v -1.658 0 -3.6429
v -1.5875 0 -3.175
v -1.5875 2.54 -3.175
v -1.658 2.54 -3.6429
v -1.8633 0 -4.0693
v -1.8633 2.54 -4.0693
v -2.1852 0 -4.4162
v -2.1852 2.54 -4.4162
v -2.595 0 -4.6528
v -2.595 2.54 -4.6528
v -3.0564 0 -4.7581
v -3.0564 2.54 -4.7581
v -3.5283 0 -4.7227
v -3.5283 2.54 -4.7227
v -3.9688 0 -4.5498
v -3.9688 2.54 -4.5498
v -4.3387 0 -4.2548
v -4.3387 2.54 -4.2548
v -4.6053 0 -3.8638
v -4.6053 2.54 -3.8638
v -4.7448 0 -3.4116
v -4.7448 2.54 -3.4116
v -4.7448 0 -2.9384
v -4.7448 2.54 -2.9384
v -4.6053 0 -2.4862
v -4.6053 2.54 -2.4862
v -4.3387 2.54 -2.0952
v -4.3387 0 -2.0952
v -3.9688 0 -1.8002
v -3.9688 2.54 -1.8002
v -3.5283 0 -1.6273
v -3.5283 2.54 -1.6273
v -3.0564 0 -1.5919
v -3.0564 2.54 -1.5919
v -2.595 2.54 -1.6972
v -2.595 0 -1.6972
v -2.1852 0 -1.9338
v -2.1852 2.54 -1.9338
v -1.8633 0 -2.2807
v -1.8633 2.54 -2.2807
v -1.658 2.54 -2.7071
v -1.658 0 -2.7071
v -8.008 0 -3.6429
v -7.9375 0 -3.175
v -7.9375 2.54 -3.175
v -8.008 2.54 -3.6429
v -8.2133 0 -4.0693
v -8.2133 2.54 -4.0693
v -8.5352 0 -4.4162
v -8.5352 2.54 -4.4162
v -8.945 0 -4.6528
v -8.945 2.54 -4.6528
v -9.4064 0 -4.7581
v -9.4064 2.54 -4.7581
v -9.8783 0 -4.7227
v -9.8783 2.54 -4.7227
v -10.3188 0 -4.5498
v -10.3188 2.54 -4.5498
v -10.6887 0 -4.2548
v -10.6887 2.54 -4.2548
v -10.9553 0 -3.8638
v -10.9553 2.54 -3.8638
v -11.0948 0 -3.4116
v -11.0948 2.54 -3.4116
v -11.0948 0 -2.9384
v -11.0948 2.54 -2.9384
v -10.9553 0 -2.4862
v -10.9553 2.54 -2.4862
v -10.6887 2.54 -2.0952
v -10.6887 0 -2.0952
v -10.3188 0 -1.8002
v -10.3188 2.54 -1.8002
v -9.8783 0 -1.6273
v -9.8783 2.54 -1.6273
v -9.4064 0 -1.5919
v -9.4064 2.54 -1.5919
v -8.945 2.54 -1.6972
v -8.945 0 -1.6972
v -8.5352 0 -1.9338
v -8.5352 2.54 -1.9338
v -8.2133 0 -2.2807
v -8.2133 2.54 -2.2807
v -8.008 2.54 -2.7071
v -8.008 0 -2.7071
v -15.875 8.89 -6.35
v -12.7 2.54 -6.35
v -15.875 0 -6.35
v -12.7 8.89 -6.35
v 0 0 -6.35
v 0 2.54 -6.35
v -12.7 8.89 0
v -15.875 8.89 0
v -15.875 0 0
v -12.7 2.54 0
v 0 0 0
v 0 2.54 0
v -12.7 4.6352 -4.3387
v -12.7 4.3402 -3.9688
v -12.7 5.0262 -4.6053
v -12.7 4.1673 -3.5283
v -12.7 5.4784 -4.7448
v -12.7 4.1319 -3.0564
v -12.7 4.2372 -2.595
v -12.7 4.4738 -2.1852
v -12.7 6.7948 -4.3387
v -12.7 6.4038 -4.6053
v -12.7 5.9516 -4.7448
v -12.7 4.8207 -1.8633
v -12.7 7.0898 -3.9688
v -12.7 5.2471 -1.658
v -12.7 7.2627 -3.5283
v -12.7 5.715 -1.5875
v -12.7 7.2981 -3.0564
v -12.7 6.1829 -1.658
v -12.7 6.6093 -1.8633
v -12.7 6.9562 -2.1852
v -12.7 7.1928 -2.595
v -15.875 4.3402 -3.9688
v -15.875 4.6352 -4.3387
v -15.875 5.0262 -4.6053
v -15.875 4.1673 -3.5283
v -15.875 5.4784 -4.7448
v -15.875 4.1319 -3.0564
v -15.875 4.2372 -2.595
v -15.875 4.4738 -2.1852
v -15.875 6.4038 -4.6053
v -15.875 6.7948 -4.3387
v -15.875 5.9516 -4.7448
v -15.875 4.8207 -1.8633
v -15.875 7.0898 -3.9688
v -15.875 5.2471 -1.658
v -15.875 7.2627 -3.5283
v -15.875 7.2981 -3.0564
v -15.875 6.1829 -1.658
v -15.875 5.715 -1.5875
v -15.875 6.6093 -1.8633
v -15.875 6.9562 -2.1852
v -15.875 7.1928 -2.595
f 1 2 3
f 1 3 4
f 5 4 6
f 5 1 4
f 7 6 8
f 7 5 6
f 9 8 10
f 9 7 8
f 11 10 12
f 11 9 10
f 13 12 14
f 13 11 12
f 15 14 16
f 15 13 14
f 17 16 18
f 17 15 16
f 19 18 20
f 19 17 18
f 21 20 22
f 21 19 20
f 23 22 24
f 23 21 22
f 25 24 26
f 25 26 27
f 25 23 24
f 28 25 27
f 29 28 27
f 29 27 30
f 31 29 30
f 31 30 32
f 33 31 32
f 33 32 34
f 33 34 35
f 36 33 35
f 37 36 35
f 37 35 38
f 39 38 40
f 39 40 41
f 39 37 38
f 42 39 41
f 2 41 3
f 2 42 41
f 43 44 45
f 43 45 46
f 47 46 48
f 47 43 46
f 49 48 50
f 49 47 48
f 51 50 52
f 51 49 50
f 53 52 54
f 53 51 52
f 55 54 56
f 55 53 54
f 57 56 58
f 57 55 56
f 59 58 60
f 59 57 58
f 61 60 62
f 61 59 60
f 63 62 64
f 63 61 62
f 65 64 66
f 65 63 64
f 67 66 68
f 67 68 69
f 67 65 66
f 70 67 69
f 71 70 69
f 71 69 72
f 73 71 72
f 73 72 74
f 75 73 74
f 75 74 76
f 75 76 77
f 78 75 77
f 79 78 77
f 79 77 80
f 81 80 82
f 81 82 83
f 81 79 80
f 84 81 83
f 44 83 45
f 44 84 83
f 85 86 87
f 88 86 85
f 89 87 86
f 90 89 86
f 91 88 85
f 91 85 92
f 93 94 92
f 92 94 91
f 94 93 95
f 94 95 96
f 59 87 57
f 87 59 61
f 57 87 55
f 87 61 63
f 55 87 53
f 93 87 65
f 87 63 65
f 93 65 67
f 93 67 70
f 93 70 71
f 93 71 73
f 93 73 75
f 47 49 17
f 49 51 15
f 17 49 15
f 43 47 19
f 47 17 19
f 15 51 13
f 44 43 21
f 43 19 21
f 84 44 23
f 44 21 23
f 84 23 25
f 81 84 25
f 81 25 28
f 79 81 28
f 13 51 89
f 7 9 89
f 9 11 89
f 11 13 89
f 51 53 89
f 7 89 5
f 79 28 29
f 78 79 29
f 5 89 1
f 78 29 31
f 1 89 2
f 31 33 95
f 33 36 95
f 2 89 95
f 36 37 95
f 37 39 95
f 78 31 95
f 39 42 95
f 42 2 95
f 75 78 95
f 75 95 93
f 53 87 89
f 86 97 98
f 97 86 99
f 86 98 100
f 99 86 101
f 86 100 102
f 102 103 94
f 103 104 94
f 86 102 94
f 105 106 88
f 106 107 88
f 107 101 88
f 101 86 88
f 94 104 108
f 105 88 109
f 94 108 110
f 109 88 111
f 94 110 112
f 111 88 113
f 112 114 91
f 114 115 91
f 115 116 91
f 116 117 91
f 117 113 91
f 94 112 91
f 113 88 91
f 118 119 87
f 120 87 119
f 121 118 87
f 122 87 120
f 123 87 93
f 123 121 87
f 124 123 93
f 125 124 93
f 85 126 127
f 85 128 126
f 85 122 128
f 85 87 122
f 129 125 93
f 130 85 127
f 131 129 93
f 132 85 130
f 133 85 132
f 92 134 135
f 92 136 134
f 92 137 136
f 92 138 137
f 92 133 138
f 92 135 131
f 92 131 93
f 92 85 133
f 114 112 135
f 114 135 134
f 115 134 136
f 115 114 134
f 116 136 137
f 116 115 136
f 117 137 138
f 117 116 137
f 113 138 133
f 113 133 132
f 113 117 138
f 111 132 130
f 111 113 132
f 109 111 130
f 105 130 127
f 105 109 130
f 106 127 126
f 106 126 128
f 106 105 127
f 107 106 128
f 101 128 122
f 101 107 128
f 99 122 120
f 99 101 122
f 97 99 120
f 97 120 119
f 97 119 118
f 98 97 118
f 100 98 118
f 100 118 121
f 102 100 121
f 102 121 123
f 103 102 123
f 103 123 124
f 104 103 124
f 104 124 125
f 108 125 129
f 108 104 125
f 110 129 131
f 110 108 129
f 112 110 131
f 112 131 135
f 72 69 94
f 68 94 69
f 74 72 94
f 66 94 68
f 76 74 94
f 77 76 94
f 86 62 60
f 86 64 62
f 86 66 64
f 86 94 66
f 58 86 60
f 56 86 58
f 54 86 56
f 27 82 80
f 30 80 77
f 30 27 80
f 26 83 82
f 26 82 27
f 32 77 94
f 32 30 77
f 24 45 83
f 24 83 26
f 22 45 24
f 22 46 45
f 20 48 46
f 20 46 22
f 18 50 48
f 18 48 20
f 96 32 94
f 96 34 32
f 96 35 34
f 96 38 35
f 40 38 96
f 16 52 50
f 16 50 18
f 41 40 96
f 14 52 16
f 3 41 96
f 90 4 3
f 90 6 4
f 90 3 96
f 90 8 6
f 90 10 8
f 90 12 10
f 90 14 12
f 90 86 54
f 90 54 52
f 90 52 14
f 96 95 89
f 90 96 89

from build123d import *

# Parameters (mm, degrees)
SKETCH1_W           = 12.7
SKETCH1_H           = 6.35
SKETCH1_R           = 1.5875
BOSS_EXTRUDE1_DEPTH = 2.54
SKETCH2_W           = 6.35
SKETCH2_H           = 8.89
SKETCH2_R           = 1.5875
BOSS_EXTRUDE2_DEPTH = 3.175


with BuildPart() as part:
    # Sketch1 → Boss-Extrude1 (new body)
    with BuildSketch(Plane(origin=(0, 0, 0), x_dir=(1, 0, 0), z_dir=(0, 1, 0))):
        with Locations((-6.35, 3.175)):
            Rectangle(SKETCH1_W, SKETCH1_H)
        with Locations((-3.175, 3.175)):
            Circle(SKETCH1_R, mode=Mode.SUBTRACT)
        with Locations((-9.525, 3.175)):
            Circle(SKETCH1_R, mode=Mode.SUBTRACT)
    extrude(amount=BOSS_EXTRUDE1_DEPTH)

    # Sketch2 → Boss-Extrude2 (add)
    with BuildSketch(Plane.ZY.offset(12.7)):
        with Locations((-3.175, 4.445)):
            Rectangle(SKETCH2_W, SKETCH2_H)
        with Locations((-3.175, 5.715)):
            Circle(SKETCH2_R, mode=Mode.SUBTRACT)
    extrude(amount=BOSS_EXTRUDE2_DEPTH)


solid = part.part
